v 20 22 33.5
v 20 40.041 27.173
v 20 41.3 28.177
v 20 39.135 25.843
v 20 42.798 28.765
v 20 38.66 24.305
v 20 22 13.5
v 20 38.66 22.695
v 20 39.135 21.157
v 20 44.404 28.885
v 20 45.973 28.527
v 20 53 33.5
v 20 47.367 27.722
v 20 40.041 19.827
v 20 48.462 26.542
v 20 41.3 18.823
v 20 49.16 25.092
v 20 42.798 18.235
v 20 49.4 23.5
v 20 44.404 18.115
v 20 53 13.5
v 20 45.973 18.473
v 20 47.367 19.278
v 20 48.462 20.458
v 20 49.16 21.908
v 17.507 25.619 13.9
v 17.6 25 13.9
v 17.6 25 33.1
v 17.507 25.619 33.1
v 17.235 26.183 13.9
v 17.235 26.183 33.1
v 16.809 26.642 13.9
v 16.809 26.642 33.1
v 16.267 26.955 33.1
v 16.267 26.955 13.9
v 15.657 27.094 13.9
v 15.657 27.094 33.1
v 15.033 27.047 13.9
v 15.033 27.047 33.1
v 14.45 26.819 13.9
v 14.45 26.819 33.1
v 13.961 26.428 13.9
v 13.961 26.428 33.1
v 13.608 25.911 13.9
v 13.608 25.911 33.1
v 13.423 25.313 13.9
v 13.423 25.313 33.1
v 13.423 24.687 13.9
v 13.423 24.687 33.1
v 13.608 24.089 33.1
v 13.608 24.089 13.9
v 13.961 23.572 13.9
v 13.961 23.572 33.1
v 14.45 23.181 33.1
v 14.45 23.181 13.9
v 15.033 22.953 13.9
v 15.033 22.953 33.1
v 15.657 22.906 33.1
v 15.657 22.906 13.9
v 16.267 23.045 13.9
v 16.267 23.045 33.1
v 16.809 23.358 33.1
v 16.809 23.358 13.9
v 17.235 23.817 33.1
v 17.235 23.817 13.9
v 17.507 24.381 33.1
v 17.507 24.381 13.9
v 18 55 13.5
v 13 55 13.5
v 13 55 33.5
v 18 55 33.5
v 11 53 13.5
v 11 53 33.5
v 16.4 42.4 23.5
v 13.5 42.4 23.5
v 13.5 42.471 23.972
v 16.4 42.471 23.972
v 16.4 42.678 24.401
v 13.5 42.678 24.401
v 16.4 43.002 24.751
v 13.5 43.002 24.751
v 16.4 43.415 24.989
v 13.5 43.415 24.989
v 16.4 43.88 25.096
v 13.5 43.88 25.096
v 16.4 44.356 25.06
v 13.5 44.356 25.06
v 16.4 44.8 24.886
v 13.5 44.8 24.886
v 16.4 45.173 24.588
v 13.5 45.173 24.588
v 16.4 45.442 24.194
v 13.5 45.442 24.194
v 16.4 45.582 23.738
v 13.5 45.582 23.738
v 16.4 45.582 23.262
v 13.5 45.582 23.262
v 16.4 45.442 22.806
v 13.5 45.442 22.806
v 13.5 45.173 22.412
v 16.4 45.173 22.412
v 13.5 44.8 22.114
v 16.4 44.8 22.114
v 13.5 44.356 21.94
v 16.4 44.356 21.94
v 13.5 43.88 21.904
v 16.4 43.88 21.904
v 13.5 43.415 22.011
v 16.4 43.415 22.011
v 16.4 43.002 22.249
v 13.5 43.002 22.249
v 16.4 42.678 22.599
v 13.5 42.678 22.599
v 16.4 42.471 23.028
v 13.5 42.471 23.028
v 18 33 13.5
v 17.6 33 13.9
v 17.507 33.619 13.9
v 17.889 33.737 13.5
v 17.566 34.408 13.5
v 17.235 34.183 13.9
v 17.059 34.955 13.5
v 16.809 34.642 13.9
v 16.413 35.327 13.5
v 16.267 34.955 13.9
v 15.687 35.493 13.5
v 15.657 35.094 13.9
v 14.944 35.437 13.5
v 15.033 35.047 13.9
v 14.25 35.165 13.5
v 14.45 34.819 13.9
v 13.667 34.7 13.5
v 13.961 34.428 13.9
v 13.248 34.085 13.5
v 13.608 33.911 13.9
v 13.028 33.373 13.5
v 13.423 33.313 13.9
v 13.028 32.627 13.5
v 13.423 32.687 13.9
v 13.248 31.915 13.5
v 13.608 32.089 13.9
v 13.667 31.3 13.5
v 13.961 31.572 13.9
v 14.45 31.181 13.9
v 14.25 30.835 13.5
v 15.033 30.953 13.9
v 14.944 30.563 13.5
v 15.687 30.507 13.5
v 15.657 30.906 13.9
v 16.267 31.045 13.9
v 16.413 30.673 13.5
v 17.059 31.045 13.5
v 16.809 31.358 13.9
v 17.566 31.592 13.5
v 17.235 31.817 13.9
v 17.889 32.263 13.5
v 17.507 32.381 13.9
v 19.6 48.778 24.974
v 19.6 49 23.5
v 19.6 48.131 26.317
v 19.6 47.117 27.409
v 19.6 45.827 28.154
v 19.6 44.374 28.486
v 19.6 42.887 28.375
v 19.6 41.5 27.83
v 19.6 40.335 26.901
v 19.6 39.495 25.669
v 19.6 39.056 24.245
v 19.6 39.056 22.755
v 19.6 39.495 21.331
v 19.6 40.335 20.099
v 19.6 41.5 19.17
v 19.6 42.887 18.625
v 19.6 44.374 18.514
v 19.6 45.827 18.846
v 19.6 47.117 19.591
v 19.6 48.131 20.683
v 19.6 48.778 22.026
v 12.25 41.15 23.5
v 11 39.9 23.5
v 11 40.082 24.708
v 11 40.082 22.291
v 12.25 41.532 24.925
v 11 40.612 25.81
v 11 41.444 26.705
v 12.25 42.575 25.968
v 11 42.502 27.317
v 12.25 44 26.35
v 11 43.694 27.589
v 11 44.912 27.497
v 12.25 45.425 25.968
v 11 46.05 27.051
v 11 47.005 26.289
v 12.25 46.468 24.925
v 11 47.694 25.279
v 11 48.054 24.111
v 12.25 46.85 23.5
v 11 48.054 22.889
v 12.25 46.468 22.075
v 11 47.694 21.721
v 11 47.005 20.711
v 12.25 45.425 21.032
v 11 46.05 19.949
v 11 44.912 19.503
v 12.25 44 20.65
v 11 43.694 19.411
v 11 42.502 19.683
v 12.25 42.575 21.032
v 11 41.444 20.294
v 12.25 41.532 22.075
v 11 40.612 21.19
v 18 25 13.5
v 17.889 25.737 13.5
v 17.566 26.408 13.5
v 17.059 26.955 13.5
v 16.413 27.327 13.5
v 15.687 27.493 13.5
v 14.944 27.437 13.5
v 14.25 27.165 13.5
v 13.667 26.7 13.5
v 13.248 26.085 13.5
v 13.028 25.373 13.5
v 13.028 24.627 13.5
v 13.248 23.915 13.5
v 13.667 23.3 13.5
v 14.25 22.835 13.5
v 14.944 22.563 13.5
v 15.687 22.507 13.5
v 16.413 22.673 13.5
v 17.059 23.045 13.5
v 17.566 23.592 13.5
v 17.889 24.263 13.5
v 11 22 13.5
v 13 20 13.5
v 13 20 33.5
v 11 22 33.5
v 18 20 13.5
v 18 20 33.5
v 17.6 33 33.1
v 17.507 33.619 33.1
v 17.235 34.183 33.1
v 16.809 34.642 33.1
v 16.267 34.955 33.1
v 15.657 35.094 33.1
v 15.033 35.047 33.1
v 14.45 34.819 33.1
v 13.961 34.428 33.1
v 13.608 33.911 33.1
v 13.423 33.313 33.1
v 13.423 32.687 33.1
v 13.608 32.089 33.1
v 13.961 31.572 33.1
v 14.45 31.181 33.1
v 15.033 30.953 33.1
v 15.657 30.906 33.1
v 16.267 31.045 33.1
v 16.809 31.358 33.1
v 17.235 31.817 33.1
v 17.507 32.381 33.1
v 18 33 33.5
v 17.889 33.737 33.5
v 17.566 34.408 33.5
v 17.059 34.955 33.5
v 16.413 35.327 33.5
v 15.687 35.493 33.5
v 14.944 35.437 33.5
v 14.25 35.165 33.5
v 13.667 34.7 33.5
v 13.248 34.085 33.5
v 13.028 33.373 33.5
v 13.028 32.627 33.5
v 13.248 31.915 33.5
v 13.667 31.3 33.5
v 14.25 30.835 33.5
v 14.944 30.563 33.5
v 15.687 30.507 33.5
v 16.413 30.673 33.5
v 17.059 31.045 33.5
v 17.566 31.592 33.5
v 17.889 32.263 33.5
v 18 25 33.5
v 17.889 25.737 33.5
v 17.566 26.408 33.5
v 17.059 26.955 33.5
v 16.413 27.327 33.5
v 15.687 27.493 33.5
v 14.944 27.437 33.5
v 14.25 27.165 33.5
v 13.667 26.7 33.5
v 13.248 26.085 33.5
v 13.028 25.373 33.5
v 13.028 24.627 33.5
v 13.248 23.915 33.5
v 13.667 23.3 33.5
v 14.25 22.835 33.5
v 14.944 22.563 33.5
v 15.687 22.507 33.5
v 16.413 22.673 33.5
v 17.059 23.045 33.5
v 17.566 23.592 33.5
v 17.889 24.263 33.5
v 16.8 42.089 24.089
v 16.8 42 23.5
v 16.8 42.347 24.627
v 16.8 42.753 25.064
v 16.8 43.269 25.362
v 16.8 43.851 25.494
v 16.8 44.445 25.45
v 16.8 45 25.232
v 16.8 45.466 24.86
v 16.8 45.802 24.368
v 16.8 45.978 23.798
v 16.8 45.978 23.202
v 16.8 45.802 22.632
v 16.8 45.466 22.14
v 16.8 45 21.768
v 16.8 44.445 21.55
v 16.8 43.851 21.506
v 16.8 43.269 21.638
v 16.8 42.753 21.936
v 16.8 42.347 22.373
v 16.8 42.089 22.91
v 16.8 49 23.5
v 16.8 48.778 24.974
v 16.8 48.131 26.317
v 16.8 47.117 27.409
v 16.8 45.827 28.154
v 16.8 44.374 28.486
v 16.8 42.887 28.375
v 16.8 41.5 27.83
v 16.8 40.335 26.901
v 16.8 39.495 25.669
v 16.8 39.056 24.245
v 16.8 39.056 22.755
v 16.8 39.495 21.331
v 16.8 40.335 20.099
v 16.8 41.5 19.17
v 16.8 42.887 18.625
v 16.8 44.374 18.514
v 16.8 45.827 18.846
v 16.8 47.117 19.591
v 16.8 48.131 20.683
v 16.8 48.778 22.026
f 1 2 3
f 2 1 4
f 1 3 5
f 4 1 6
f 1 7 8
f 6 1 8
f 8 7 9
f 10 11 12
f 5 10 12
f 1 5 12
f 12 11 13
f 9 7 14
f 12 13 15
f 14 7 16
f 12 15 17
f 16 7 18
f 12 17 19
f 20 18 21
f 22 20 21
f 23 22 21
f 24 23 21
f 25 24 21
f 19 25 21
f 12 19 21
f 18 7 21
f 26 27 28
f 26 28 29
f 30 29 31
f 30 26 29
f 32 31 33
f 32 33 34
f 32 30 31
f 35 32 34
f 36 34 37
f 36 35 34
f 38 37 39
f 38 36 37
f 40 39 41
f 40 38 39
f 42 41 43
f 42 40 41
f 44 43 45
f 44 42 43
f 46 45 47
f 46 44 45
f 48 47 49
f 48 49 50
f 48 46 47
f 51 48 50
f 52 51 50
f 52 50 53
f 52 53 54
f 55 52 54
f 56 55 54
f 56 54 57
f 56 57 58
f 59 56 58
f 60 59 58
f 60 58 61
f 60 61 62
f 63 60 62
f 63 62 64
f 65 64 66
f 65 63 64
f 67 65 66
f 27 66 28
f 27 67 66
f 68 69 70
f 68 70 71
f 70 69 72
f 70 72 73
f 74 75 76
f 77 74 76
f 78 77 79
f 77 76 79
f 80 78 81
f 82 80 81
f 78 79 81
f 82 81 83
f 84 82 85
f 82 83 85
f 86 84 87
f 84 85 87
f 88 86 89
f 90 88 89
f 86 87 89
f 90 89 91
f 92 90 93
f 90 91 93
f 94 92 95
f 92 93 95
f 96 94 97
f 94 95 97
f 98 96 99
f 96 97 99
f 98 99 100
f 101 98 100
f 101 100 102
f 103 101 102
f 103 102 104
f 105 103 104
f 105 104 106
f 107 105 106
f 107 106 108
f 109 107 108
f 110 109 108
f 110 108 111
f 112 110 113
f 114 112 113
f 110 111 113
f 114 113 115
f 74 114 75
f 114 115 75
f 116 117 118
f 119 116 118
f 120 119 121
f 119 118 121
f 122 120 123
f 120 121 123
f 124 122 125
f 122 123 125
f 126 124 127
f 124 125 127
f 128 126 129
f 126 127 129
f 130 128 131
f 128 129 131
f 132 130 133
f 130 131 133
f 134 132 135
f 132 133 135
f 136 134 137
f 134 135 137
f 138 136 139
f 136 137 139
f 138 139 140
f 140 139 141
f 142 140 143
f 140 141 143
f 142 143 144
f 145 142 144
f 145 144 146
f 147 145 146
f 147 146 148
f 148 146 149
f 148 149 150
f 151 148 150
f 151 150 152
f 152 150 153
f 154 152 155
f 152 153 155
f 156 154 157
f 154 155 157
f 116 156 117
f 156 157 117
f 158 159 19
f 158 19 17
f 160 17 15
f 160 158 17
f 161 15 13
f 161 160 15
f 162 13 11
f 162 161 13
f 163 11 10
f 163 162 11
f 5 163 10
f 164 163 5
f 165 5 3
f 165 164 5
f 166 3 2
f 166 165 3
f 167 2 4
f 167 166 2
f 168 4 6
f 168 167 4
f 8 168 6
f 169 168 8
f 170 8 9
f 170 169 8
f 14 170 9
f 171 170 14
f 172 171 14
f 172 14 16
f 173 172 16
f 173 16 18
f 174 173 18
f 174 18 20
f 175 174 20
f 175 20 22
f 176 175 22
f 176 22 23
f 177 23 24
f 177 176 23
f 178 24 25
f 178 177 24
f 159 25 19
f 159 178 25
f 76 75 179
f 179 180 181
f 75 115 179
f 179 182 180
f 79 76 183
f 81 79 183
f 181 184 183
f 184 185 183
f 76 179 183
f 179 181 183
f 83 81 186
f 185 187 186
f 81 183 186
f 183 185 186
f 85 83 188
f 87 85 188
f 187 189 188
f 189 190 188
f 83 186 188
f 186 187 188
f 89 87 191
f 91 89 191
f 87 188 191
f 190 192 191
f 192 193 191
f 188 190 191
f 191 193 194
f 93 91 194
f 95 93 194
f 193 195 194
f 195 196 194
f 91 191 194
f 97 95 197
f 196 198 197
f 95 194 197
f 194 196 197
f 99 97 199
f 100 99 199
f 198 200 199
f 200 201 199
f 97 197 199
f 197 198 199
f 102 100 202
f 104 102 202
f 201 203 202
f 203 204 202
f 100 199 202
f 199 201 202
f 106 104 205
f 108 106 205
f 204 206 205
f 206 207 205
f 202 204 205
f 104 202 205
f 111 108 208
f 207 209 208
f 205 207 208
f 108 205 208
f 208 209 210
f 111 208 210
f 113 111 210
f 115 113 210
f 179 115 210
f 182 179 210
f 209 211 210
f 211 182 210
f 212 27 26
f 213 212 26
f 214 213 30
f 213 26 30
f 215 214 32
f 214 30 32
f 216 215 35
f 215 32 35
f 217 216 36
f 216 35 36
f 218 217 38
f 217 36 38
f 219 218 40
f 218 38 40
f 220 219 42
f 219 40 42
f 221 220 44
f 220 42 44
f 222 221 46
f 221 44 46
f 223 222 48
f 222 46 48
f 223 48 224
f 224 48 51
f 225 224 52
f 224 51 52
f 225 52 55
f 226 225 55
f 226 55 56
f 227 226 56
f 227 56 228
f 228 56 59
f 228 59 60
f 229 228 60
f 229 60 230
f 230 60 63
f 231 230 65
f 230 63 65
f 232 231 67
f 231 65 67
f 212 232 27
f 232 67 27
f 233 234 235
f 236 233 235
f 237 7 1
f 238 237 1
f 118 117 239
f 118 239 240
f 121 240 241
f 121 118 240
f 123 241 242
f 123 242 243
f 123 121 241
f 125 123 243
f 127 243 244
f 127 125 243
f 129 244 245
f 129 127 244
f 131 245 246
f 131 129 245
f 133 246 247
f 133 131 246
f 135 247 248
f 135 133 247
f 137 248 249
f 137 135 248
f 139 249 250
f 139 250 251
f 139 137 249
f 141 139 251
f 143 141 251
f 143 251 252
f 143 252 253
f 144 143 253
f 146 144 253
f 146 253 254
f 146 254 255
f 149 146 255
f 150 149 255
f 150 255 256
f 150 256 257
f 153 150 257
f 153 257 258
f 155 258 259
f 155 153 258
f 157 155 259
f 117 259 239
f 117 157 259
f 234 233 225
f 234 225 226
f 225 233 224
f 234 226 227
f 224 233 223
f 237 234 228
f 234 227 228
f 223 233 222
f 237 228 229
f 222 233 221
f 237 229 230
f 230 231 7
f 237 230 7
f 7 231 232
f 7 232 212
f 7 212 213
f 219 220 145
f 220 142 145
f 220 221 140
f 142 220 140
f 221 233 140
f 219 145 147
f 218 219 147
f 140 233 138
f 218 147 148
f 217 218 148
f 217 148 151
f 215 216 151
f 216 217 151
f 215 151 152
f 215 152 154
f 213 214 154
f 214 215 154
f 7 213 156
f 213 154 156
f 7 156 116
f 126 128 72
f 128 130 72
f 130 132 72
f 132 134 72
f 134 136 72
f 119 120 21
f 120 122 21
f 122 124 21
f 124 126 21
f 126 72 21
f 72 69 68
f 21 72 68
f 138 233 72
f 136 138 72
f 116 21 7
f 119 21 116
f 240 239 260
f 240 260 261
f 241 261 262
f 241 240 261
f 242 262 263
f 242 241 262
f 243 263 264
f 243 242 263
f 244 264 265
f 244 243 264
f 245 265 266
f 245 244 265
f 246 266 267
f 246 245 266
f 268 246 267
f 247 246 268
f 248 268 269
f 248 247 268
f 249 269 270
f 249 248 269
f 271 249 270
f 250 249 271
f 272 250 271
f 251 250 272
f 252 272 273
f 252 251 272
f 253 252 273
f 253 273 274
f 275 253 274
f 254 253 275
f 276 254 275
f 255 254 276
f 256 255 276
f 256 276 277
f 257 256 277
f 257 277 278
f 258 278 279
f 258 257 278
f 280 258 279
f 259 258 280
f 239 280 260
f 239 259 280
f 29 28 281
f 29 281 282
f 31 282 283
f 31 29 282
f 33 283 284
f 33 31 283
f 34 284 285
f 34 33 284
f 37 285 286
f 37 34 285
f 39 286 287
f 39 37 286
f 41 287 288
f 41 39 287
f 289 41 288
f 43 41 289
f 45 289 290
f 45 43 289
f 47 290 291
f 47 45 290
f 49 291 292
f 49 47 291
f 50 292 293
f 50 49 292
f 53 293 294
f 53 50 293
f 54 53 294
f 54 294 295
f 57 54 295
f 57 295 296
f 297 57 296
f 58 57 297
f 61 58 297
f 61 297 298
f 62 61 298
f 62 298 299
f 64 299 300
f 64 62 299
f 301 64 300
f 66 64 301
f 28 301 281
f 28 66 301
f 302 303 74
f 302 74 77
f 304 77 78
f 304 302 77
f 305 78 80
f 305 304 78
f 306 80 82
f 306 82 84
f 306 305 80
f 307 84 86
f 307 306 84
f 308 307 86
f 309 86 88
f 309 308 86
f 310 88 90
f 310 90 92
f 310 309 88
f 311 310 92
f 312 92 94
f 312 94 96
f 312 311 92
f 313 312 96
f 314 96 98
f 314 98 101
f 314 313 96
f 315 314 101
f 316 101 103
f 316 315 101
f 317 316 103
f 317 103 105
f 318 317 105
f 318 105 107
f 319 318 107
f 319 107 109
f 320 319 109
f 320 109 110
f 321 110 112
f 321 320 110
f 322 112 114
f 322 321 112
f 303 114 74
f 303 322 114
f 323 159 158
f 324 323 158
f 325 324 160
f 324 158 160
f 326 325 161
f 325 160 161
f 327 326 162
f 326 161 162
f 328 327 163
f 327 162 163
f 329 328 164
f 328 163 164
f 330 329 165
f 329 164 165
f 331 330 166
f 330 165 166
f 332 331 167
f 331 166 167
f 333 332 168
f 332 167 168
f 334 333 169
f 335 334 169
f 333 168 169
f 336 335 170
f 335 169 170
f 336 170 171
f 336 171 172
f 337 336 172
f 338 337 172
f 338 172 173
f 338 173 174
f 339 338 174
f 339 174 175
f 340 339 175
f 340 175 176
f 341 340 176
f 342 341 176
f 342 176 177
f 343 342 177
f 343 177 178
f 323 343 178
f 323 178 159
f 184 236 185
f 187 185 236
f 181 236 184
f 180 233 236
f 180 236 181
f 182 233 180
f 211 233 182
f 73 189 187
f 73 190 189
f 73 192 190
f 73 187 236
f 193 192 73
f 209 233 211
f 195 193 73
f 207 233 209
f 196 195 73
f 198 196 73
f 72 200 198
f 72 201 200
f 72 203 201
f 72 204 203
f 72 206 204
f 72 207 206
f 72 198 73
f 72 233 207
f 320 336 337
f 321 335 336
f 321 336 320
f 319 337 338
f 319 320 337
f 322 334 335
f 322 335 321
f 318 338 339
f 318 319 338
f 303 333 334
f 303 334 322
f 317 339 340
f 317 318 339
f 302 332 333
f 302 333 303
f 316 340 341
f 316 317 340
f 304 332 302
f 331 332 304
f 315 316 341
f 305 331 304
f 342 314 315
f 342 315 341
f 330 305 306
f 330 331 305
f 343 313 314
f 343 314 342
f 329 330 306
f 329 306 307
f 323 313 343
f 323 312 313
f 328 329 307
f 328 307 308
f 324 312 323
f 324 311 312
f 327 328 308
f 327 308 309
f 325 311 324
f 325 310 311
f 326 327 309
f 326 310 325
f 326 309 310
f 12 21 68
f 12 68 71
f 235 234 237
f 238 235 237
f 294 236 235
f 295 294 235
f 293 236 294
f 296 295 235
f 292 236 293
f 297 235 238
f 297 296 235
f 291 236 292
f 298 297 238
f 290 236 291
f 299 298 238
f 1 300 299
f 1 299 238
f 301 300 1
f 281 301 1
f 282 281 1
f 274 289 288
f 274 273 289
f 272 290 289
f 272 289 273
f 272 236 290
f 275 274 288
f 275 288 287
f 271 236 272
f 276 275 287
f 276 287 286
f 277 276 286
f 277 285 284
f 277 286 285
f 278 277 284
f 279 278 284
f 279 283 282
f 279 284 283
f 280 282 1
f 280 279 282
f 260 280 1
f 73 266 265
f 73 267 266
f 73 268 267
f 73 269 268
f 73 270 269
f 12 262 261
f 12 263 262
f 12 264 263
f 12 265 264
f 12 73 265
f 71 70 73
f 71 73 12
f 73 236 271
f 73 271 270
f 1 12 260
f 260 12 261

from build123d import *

# Parameters (mm, degrees)
SKETCH152_W      = 9
SKETCH152_H      = 35
SKETCH152_R      = 2.1
PAD086_DEPTH     = 20
CHAMFER056_SIZE  = 2
HOLE_D           = 3.2
HOLE_CBORE_D     = 10
HOLE_CBORE_DEPTH = 3.2
CHAMFER057_SIZE  = 0.4
CHAMFER058_SIZE  = 2.5
CHAMFER059_SIZE  = 0.4


with BuildPart() as part:
    # Sketch152 → Pad086 (new body)
    with BuildSketch(Plane.XY):
        with Locations((0, 8.5)):
            Rectangle(SKETCH152_W, SKETCH152_H)
        with Locations((0, 4)):
            Circle(SKETCH152_R, mode=Mode.SUBTRACT)
        with Locations((0, -4)):
            Circle(SKETCH152_R, mode=Mode.SUBTRACT)
    extrude(amount=PAD086_DEPTH)

    # Chamfer056
    chamfer056_edges = [part.edges().sort_by_distance(p)[0] for p in [
        (4.5, -9, 10),
        (-4.5, -9, 10),
        (-4.5, 26, 10),
        (4.5, 26, 10),
    ]]
    chamfer(chamfer056_edges, length=CHAMFER056_SIZE)

    # Hole (through all)
    with Locations(Plane.YZ.offset(4.5)):
        with Locations((15, 10)):
            CounterBoreHole(HOLE_D / 2, HOLE_CBORE_D / 2, HOLE_CBORE_DEPTH)

    # Chamfer057
    chamfer057_edges = [part.edges().sort_by_distance(p)[0] for p in [
        (1.3, 15, 11.6),
        (4.5, 15, 15),
    ]]
    chamfer(chamfer057_edges, length=CHAMFER057_SIZE)

    # Chamfer058
    chamfer058_edges = [part.edges().sort_by_distance(p)[0] for p in [
        (-4.5, 15, 11.6),
    ]]
    chamfer(chamfer058_edges, length=CHAMFER058_SIZE)

    # Chamfer059
    chamfer059_edges = [part.edges().sort_by_distance(p)[0] for p in [
        (-2.1, 4, 20),
        (-2.1, -4, 20),
        (-2.1, 4, 0),
        (-2.1, -4, 0),
    ]]
    chamfer(chamfer059_edges, length=CHAMFER059_SIZE)


with BuildPart() as part_1:
    # Body074 placement: moved
    add(part.part.moved(Location((15.5, 28.999977, 13.499984))))


solid = part_1.part
